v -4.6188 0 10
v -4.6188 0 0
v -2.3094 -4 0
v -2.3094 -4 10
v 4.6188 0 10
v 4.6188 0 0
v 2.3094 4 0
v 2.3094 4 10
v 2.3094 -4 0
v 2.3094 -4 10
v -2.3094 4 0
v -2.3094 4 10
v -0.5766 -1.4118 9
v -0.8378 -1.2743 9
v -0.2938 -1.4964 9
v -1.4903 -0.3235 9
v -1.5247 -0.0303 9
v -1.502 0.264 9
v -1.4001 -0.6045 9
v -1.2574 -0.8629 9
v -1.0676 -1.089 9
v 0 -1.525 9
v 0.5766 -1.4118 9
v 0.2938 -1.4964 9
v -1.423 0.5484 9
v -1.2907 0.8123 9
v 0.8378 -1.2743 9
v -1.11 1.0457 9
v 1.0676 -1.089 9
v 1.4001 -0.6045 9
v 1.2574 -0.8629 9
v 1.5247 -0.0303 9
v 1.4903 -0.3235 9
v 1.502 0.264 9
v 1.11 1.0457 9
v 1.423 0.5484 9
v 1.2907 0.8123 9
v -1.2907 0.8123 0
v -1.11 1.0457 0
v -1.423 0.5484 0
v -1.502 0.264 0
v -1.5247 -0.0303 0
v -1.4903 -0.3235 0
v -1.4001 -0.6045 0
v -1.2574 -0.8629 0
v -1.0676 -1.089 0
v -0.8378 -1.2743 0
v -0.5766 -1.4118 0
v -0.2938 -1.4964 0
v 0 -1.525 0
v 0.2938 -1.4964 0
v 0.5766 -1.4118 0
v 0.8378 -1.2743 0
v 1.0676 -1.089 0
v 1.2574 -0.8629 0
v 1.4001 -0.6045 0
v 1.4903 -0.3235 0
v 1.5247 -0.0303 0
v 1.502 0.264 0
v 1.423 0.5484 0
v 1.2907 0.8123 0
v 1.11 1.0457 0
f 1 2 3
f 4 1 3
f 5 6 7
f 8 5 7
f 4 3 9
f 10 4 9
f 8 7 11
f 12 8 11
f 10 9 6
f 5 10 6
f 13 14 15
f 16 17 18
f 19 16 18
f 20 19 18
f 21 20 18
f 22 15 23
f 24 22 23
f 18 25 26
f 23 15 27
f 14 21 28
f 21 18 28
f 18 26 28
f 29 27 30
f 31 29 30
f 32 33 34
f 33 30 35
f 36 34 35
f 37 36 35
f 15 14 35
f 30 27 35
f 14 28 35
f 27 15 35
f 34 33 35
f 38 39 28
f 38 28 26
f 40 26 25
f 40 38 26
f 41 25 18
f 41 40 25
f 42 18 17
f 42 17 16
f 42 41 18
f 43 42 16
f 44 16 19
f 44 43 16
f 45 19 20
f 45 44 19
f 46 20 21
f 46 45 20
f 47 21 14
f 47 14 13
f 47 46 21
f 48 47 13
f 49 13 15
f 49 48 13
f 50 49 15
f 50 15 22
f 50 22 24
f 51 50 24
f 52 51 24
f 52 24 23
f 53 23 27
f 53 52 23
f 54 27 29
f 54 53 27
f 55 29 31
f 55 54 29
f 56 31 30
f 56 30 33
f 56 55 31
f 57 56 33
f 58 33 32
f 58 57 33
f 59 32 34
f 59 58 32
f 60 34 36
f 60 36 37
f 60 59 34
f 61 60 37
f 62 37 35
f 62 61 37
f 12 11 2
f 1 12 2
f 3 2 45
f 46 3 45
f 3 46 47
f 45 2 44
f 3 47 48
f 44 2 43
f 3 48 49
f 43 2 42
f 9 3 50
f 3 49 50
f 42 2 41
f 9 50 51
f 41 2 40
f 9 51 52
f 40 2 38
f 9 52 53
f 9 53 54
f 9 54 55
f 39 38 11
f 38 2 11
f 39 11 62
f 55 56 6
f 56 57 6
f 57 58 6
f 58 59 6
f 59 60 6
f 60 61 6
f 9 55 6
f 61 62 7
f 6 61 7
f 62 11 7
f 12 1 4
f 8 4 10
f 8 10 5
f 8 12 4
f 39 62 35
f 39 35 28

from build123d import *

# Parameters (mm, degrees)
BOSS_EXTRUDE1_DEPTH = 10
CUT_EXTRUDE1_DEPTH  = 9


with BuildPart() as part:
    # Sketch1 → Boss-Extrude1 (new body)
    with BuildSketch(Plane.XY):
        Polygon((4.618802154, 0), (2.309401077, 4), (-2.309401077, 4), (-4.618802154, 0), (-2.309401077, -4), (2.309401077, -4), align=None)
    extrude(amount=BOSS_EXTRUDE1_DEPTH)

    # Sketch2 → Cut-Extrude1 (cut)
    with BuildSketch(Plane(origin=(0, 0, 0), x_dir=(-1, 0, 0), z_dir=(0, 0, -1))):
        with BuildLine():
            Line((-1.11, 1.045717457), (1.11, 1.045717457))
            ThreePointArc((1.11, 1.045717457), (0, -1.525), (-1.11, 1.045717457))
        make_face()
    extrude(amount=-CUT_EXTRUDE1_DEPTH, mode=Mode.SUBTRACT)


solid = part.part
